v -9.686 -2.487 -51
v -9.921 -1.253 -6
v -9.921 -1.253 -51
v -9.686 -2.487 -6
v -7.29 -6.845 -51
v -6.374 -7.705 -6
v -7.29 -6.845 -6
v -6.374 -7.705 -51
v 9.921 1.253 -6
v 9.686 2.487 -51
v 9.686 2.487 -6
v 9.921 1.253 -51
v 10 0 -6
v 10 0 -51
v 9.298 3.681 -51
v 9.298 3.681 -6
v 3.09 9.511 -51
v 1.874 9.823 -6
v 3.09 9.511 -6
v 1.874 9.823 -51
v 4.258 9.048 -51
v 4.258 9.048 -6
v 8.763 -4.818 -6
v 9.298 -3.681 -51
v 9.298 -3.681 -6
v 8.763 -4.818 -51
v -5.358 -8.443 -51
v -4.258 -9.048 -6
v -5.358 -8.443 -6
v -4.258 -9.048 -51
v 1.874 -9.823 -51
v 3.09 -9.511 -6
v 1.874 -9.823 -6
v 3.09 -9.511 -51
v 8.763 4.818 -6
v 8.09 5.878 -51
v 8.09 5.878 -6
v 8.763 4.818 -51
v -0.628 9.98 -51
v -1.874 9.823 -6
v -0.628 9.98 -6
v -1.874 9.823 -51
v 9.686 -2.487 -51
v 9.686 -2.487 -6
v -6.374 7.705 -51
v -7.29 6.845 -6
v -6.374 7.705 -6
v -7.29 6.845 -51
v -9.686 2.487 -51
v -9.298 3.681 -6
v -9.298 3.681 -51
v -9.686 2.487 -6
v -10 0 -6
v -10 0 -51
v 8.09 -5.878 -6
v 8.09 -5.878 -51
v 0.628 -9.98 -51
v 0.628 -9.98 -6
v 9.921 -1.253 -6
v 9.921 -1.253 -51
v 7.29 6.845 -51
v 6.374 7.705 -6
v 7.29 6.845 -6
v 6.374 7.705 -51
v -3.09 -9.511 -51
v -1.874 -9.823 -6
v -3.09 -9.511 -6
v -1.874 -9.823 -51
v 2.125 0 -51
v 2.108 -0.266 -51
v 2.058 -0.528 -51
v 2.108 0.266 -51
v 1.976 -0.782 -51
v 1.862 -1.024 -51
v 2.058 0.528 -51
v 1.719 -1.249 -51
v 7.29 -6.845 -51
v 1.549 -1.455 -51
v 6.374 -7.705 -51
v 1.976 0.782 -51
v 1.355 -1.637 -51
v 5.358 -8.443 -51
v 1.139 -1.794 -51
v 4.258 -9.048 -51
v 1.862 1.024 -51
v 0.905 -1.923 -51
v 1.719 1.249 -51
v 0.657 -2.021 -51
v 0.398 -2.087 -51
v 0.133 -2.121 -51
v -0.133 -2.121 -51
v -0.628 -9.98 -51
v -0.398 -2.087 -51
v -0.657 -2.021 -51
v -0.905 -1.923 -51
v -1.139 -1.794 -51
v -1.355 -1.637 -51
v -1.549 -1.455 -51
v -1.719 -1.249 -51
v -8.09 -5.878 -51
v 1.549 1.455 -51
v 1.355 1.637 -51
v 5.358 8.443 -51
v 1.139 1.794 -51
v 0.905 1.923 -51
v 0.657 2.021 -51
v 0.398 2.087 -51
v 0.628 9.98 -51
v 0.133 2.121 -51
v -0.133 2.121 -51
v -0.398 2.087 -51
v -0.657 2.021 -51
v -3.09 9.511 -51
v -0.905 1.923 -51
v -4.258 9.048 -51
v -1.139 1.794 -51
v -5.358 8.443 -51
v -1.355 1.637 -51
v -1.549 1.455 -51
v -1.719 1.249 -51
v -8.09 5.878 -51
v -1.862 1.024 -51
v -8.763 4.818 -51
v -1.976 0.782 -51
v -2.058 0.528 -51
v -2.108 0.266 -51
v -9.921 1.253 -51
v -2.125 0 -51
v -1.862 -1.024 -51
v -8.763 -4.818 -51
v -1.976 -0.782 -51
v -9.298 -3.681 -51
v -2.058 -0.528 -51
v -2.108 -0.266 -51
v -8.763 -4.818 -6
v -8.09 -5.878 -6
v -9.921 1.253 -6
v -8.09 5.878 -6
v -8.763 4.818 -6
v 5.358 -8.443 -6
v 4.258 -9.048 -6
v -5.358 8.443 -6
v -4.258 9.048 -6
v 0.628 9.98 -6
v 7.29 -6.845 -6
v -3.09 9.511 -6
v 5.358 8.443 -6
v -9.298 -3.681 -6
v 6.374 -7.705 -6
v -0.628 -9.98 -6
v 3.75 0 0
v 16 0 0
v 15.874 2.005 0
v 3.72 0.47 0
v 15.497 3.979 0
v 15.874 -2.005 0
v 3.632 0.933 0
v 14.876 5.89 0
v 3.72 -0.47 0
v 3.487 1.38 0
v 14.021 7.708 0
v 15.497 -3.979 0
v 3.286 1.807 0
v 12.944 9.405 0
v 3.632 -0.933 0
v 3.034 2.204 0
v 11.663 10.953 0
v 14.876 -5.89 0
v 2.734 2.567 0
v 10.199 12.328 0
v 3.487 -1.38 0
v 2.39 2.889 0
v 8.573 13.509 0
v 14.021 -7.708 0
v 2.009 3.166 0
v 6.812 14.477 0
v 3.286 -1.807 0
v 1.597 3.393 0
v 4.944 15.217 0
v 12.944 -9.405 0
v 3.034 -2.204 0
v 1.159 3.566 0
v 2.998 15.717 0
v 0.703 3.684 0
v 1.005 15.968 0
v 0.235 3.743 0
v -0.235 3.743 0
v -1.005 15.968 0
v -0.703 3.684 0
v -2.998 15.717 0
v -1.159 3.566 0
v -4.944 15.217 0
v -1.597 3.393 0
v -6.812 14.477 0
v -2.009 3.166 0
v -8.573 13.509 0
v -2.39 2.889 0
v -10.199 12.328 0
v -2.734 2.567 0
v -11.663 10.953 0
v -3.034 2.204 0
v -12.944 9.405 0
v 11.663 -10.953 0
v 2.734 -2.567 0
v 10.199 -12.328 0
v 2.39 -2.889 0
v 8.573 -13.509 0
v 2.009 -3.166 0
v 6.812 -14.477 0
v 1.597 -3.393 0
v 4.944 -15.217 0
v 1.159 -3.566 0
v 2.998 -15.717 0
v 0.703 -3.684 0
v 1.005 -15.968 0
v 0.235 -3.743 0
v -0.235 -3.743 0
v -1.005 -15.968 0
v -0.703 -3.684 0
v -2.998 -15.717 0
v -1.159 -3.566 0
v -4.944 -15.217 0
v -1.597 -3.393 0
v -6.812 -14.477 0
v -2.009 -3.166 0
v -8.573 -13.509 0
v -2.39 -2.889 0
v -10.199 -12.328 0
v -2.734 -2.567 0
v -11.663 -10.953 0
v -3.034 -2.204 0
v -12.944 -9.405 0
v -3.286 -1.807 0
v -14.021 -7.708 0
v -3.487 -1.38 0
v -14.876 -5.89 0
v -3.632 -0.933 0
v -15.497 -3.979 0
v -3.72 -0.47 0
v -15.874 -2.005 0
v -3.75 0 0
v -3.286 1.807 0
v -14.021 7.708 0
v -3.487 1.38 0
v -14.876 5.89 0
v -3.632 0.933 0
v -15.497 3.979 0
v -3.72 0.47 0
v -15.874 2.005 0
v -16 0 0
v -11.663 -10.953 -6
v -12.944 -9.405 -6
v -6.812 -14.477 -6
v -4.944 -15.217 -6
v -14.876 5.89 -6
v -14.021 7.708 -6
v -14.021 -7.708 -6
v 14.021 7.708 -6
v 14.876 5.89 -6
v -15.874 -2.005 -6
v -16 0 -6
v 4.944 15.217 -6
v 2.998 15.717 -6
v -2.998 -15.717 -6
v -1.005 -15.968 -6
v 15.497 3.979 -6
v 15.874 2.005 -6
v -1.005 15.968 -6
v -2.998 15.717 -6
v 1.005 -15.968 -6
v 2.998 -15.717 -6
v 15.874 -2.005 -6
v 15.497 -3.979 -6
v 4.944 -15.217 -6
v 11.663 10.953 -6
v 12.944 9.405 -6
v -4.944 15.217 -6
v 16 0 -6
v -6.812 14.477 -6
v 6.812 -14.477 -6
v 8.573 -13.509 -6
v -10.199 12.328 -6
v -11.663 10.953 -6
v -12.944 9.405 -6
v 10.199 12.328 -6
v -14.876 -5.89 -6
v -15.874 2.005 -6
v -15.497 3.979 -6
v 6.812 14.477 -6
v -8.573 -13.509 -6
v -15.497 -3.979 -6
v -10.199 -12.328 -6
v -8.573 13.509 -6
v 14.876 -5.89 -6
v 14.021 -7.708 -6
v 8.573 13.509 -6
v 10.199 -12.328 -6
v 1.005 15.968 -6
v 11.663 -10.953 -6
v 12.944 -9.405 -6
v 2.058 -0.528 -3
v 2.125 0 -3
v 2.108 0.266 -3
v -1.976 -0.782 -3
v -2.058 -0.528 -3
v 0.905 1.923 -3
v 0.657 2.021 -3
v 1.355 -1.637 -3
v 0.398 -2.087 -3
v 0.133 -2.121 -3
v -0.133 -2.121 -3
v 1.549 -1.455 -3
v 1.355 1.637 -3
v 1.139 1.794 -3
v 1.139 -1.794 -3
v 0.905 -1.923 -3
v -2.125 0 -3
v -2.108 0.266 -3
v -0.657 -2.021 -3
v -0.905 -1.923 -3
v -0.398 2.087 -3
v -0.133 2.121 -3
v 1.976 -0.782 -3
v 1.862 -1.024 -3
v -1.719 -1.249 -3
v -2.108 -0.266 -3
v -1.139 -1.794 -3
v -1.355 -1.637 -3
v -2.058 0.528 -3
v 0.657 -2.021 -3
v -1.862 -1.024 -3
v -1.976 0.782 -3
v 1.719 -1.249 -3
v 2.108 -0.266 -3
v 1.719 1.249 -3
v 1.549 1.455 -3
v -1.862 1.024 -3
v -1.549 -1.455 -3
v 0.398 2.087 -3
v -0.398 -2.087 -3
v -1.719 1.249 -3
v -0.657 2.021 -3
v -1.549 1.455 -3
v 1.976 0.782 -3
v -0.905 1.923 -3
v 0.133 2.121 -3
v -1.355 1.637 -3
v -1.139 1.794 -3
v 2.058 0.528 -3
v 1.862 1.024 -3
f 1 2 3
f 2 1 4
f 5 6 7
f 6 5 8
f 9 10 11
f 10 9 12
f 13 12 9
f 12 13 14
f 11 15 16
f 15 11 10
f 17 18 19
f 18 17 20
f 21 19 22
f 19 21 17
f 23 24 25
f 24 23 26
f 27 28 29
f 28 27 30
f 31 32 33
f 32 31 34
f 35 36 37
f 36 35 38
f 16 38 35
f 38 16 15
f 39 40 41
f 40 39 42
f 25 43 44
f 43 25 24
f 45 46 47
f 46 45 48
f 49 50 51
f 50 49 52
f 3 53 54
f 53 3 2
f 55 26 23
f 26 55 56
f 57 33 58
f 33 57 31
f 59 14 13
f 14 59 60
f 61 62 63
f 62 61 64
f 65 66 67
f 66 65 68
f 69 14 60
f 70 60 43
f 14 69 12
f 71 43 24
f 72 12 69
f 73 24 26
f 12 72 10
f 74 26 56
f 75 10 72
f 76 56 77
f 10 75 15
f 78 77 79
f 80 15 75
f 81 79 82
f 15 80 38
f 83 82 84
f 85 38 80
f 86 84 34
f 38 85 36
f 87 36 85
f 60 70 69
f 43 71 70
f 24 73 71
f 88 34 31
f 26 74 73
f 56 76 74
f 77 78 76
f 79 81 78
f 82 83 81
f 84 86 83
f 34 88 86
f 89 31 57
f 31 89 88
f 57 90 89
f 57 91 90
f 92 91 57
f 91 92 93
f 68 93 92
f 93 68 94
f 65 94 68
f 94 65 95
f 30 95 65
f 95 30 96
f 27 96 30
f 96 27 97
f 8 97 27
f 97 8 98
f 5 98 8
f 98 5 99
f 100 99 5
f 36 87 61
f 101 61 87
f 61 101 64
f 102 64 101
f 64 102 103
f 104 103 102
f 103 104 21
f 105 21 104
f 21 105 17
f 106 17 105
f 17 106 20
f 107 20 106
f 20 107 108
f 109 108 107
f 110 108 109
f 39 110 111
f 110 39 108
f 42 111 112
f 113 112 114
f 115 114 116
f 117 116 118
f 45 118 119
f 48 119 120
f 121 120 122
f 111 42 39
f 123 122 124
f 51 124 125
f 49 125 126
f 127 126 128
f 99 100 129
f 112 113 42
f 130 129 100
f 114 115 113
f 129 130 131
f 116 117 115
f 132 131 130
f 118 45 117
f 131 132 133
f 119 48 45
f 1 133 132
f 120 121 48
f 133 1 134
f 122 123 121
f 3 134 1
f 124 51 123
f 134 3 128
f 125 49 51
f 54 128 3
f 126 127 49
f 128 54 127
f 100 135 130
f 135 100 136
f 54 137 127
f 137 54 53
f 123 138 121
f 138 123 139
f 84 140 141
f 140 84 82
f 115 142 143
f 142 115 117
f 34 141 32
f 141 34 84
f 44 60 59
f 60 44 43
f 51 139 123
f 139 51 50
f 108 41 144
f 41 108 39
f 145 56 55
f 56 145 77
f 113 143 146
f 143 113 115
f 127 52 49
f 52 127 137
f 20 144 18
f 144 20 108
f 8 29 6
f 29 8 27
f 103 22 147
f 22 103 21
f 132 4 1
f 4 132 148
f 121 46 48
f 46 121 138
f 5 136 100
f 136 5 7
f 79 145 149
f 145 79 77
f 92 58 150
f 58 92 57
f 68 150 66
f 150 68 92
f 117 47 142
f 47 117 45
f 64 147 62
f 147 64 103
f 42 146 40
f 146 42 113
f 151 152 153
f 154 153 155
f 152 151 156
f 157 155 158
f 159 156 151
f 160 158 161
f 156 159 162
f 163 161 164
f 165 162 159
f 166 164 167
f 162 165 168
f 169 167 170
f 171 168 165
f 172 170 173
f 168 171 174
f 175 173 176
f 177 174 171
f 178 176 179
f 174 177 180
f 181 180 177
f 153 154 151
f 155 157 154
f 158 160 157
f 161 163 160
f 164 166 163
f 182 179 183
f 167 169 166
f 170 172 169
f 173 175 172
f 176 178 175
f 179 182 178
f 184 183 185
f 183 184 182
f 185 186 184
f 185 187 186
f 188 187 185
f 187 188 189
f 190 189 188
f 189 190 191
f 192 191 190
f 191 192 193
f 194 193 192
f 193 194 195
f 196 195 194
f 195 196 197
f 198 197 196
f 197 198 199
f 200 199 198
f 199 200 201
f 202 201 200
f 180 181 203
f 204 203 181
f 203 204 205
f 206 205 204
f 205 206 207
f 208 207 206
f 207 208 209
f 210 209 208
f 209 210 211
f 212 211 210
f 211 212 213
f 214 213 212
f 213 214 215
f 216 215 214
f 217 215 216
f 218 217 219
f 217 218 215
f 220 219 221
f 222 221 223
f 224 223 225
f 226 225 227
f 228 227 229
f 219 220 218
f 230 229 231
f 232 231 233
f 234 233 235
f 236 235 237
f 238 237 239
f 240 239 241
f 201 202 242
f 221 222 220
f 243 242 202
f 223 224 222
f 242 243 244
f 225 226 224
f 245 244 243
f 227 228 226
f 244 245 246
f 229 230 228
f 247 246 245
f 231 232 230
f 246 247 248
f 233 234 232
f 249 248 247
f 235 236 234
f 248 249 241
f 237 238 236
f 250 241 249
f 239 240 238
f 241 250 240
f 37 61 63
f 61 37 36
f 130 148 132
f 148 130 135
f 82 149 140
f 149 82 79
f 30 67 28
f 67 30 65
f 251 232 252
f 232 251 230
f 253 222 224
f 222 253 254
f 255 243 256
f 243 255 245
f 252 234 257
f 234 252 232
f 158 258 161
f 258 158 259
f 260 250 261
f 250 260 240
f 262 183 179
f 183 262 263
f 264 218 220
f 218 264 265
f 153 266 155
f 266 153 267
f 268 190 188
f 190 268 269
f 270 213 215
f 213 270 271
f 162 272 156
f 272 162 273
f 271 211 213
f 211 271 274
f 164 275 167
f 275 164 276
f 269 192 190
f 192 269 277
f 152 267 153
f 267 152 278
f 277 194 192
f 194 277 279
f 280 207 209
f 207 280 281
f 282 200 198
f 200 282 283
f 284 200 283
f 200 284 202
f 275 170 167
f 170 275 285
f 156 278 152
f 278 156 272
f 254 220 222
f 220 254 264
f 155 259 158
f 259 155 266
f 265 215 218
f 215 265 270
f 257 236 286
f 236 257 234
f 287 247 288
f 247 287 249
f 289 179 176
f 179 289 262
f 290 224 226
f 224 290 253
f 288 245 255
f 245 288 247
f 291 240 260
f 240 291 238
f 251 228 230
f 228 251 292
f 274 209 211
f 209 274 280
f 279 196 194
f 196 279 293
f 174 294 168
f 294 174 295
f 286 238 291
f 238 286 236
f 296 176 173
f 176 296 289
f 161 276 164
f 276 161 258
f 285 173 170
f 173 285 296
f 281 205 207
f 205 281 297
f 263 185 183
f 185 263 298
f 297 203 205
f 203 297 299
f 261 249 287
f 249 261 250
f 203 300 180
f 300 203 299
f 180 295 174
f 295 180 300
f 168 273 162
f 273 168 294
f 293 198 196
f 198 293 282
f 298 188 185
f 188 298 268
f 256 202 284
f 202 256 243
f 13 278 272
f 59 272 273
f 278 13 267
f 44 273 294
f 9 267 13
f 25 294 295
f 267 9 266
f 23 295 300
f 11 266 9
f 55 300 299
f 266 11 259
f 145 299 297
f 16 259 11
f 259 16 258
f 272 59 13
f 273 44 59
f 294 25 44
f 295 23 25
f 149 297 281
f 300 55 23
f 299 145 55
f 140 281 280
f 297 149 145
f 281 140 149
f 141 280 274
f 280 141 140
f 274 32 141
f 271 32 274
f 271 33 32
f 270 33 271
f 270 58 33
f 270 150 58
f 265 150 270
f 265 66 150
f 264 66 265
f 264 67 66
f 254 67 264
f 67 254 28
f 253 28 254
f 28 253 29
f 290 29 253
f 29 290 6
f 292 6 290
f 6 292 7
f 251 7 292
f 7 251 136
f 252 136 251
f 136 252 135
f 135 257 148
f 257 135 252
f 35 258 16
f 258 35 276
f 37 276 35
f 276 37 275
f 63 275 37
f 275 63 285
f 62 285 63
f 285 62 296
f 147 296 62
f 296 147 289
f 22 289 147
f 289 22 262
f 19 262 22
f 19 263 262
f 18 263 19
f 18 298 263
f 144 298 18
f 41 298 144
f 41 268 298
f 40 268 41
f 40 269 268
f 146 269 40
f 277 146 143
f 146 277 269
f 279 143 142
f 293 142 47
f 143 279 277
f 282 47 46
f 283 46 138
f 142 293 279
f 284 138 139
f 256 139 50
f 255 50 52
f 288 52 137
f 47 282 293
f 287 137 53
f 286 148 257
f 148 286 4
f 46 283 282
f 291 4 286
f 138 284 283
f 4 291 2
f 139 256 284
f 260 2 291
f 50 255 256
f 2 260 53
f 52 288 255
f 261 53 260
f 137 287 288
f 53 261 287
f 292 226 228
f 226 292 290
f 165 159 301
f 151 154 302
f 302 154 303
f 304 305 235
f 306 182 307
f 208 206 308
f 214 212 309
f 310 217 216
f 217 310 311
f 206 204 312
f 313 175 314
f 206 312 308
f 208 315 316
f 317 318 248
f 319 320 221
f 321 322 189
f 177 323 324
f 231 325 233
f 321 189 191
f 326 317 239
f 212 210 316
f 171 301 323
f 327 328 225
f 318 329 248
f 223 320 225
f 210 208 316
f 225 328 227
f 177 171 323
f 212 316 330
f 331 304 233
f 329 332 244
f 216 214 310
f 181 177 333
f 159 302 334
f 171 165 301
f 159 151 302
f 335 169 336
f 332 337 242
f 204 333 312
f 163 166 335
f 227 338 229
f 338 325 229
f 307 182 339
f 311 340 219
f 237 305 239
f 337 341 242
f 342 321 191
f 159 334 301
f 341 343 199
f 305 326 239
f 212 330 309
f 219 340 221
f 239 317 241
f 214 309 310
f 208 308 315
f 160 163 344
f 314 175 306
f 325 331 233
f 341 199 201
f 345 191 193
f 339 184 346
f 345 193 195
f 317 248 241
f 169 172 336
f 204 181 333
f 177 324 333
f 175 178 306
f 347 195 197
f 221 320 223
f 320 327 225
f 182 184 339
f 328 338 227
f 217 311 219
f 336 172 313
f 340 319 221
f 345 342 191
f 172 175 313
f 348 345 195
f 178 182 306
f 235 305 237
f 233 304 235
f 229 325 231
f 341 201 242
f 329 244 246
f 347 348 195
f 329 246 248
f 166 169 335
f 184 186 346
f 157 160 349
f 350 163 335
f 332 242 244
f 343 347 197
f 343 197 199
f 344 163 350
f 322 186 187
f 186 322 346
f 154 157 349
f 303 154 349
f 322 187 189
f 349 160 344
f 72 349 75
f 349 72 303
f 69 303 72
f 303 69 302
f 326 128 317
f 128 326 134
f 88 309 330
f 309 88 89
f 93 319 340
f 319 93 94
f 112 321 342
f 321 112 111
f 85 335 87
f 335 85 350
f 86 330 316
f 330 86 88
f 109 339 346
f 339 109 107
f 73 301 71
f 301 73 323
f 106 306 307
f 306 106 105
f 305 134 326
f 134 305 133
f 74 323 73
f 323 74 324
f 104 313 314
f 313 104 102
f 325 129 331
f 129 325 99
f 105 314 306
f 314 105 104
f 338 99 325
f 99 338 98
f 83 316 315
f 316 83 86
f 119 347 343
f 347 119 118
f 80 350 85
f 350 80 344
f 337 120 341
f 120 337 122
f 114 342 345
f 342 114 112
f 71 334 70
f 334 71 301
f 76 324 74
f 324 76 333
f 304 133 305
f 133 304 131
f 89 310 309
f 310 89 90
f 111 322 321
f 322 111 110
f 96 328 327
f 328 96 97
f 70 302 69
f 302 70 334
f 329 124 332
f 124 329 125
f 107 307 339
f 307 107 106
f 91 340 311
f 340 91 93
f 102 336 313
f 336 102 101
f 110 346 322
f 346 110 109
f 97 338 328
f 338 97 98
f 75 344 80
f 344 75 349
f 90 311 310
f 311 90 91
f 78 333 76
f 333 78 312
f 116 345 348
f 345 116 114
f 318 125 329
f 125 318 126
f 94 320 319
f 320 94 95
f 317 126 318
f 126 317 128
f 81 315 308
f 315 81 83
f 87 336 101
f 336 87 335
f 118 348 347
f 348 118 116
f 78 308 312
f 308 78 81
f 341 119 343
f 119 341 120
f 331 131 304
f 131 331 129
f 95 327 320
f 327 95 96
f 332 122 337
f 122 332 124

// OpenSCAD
$fn = 50;


difference() {
	union() {
		translate(v = [0, 0, -51.0000000000]) {
			cylinder(h = 51, r = 10.0000000000);
		}
		translate(v = [0, 0, -6.0000000000]) {
			cylinder(h = 6, r = 16.0000000000);
		}
	}
	union() {
		translate(v = [0, 0, 0]) {
			rotate(a = [0, 0, 0]) {
				difference() {
					union() {
						#translate(v = [0, 0, -51.0000000000]) {
							cylinder(h = 51, r = 2.0000000000);
						}
						#translate(v = [0, 0, -3]) {
							cylinder(h = 3, r = 10.0000000000, r1 = 2.1250000000, r2 = 3.7500000000);
						}
						#translate(v = [0, 0, -51.0000000000]) {
							cylinder(h = 51, r = 2.1250000000);
						}
						#translate(v = [0, 0, -51.0000000000]) {
							cylinder(h = 51, r = 2.0000000000);
						}
					}
					union();
				}
			}
		}
	}
}
